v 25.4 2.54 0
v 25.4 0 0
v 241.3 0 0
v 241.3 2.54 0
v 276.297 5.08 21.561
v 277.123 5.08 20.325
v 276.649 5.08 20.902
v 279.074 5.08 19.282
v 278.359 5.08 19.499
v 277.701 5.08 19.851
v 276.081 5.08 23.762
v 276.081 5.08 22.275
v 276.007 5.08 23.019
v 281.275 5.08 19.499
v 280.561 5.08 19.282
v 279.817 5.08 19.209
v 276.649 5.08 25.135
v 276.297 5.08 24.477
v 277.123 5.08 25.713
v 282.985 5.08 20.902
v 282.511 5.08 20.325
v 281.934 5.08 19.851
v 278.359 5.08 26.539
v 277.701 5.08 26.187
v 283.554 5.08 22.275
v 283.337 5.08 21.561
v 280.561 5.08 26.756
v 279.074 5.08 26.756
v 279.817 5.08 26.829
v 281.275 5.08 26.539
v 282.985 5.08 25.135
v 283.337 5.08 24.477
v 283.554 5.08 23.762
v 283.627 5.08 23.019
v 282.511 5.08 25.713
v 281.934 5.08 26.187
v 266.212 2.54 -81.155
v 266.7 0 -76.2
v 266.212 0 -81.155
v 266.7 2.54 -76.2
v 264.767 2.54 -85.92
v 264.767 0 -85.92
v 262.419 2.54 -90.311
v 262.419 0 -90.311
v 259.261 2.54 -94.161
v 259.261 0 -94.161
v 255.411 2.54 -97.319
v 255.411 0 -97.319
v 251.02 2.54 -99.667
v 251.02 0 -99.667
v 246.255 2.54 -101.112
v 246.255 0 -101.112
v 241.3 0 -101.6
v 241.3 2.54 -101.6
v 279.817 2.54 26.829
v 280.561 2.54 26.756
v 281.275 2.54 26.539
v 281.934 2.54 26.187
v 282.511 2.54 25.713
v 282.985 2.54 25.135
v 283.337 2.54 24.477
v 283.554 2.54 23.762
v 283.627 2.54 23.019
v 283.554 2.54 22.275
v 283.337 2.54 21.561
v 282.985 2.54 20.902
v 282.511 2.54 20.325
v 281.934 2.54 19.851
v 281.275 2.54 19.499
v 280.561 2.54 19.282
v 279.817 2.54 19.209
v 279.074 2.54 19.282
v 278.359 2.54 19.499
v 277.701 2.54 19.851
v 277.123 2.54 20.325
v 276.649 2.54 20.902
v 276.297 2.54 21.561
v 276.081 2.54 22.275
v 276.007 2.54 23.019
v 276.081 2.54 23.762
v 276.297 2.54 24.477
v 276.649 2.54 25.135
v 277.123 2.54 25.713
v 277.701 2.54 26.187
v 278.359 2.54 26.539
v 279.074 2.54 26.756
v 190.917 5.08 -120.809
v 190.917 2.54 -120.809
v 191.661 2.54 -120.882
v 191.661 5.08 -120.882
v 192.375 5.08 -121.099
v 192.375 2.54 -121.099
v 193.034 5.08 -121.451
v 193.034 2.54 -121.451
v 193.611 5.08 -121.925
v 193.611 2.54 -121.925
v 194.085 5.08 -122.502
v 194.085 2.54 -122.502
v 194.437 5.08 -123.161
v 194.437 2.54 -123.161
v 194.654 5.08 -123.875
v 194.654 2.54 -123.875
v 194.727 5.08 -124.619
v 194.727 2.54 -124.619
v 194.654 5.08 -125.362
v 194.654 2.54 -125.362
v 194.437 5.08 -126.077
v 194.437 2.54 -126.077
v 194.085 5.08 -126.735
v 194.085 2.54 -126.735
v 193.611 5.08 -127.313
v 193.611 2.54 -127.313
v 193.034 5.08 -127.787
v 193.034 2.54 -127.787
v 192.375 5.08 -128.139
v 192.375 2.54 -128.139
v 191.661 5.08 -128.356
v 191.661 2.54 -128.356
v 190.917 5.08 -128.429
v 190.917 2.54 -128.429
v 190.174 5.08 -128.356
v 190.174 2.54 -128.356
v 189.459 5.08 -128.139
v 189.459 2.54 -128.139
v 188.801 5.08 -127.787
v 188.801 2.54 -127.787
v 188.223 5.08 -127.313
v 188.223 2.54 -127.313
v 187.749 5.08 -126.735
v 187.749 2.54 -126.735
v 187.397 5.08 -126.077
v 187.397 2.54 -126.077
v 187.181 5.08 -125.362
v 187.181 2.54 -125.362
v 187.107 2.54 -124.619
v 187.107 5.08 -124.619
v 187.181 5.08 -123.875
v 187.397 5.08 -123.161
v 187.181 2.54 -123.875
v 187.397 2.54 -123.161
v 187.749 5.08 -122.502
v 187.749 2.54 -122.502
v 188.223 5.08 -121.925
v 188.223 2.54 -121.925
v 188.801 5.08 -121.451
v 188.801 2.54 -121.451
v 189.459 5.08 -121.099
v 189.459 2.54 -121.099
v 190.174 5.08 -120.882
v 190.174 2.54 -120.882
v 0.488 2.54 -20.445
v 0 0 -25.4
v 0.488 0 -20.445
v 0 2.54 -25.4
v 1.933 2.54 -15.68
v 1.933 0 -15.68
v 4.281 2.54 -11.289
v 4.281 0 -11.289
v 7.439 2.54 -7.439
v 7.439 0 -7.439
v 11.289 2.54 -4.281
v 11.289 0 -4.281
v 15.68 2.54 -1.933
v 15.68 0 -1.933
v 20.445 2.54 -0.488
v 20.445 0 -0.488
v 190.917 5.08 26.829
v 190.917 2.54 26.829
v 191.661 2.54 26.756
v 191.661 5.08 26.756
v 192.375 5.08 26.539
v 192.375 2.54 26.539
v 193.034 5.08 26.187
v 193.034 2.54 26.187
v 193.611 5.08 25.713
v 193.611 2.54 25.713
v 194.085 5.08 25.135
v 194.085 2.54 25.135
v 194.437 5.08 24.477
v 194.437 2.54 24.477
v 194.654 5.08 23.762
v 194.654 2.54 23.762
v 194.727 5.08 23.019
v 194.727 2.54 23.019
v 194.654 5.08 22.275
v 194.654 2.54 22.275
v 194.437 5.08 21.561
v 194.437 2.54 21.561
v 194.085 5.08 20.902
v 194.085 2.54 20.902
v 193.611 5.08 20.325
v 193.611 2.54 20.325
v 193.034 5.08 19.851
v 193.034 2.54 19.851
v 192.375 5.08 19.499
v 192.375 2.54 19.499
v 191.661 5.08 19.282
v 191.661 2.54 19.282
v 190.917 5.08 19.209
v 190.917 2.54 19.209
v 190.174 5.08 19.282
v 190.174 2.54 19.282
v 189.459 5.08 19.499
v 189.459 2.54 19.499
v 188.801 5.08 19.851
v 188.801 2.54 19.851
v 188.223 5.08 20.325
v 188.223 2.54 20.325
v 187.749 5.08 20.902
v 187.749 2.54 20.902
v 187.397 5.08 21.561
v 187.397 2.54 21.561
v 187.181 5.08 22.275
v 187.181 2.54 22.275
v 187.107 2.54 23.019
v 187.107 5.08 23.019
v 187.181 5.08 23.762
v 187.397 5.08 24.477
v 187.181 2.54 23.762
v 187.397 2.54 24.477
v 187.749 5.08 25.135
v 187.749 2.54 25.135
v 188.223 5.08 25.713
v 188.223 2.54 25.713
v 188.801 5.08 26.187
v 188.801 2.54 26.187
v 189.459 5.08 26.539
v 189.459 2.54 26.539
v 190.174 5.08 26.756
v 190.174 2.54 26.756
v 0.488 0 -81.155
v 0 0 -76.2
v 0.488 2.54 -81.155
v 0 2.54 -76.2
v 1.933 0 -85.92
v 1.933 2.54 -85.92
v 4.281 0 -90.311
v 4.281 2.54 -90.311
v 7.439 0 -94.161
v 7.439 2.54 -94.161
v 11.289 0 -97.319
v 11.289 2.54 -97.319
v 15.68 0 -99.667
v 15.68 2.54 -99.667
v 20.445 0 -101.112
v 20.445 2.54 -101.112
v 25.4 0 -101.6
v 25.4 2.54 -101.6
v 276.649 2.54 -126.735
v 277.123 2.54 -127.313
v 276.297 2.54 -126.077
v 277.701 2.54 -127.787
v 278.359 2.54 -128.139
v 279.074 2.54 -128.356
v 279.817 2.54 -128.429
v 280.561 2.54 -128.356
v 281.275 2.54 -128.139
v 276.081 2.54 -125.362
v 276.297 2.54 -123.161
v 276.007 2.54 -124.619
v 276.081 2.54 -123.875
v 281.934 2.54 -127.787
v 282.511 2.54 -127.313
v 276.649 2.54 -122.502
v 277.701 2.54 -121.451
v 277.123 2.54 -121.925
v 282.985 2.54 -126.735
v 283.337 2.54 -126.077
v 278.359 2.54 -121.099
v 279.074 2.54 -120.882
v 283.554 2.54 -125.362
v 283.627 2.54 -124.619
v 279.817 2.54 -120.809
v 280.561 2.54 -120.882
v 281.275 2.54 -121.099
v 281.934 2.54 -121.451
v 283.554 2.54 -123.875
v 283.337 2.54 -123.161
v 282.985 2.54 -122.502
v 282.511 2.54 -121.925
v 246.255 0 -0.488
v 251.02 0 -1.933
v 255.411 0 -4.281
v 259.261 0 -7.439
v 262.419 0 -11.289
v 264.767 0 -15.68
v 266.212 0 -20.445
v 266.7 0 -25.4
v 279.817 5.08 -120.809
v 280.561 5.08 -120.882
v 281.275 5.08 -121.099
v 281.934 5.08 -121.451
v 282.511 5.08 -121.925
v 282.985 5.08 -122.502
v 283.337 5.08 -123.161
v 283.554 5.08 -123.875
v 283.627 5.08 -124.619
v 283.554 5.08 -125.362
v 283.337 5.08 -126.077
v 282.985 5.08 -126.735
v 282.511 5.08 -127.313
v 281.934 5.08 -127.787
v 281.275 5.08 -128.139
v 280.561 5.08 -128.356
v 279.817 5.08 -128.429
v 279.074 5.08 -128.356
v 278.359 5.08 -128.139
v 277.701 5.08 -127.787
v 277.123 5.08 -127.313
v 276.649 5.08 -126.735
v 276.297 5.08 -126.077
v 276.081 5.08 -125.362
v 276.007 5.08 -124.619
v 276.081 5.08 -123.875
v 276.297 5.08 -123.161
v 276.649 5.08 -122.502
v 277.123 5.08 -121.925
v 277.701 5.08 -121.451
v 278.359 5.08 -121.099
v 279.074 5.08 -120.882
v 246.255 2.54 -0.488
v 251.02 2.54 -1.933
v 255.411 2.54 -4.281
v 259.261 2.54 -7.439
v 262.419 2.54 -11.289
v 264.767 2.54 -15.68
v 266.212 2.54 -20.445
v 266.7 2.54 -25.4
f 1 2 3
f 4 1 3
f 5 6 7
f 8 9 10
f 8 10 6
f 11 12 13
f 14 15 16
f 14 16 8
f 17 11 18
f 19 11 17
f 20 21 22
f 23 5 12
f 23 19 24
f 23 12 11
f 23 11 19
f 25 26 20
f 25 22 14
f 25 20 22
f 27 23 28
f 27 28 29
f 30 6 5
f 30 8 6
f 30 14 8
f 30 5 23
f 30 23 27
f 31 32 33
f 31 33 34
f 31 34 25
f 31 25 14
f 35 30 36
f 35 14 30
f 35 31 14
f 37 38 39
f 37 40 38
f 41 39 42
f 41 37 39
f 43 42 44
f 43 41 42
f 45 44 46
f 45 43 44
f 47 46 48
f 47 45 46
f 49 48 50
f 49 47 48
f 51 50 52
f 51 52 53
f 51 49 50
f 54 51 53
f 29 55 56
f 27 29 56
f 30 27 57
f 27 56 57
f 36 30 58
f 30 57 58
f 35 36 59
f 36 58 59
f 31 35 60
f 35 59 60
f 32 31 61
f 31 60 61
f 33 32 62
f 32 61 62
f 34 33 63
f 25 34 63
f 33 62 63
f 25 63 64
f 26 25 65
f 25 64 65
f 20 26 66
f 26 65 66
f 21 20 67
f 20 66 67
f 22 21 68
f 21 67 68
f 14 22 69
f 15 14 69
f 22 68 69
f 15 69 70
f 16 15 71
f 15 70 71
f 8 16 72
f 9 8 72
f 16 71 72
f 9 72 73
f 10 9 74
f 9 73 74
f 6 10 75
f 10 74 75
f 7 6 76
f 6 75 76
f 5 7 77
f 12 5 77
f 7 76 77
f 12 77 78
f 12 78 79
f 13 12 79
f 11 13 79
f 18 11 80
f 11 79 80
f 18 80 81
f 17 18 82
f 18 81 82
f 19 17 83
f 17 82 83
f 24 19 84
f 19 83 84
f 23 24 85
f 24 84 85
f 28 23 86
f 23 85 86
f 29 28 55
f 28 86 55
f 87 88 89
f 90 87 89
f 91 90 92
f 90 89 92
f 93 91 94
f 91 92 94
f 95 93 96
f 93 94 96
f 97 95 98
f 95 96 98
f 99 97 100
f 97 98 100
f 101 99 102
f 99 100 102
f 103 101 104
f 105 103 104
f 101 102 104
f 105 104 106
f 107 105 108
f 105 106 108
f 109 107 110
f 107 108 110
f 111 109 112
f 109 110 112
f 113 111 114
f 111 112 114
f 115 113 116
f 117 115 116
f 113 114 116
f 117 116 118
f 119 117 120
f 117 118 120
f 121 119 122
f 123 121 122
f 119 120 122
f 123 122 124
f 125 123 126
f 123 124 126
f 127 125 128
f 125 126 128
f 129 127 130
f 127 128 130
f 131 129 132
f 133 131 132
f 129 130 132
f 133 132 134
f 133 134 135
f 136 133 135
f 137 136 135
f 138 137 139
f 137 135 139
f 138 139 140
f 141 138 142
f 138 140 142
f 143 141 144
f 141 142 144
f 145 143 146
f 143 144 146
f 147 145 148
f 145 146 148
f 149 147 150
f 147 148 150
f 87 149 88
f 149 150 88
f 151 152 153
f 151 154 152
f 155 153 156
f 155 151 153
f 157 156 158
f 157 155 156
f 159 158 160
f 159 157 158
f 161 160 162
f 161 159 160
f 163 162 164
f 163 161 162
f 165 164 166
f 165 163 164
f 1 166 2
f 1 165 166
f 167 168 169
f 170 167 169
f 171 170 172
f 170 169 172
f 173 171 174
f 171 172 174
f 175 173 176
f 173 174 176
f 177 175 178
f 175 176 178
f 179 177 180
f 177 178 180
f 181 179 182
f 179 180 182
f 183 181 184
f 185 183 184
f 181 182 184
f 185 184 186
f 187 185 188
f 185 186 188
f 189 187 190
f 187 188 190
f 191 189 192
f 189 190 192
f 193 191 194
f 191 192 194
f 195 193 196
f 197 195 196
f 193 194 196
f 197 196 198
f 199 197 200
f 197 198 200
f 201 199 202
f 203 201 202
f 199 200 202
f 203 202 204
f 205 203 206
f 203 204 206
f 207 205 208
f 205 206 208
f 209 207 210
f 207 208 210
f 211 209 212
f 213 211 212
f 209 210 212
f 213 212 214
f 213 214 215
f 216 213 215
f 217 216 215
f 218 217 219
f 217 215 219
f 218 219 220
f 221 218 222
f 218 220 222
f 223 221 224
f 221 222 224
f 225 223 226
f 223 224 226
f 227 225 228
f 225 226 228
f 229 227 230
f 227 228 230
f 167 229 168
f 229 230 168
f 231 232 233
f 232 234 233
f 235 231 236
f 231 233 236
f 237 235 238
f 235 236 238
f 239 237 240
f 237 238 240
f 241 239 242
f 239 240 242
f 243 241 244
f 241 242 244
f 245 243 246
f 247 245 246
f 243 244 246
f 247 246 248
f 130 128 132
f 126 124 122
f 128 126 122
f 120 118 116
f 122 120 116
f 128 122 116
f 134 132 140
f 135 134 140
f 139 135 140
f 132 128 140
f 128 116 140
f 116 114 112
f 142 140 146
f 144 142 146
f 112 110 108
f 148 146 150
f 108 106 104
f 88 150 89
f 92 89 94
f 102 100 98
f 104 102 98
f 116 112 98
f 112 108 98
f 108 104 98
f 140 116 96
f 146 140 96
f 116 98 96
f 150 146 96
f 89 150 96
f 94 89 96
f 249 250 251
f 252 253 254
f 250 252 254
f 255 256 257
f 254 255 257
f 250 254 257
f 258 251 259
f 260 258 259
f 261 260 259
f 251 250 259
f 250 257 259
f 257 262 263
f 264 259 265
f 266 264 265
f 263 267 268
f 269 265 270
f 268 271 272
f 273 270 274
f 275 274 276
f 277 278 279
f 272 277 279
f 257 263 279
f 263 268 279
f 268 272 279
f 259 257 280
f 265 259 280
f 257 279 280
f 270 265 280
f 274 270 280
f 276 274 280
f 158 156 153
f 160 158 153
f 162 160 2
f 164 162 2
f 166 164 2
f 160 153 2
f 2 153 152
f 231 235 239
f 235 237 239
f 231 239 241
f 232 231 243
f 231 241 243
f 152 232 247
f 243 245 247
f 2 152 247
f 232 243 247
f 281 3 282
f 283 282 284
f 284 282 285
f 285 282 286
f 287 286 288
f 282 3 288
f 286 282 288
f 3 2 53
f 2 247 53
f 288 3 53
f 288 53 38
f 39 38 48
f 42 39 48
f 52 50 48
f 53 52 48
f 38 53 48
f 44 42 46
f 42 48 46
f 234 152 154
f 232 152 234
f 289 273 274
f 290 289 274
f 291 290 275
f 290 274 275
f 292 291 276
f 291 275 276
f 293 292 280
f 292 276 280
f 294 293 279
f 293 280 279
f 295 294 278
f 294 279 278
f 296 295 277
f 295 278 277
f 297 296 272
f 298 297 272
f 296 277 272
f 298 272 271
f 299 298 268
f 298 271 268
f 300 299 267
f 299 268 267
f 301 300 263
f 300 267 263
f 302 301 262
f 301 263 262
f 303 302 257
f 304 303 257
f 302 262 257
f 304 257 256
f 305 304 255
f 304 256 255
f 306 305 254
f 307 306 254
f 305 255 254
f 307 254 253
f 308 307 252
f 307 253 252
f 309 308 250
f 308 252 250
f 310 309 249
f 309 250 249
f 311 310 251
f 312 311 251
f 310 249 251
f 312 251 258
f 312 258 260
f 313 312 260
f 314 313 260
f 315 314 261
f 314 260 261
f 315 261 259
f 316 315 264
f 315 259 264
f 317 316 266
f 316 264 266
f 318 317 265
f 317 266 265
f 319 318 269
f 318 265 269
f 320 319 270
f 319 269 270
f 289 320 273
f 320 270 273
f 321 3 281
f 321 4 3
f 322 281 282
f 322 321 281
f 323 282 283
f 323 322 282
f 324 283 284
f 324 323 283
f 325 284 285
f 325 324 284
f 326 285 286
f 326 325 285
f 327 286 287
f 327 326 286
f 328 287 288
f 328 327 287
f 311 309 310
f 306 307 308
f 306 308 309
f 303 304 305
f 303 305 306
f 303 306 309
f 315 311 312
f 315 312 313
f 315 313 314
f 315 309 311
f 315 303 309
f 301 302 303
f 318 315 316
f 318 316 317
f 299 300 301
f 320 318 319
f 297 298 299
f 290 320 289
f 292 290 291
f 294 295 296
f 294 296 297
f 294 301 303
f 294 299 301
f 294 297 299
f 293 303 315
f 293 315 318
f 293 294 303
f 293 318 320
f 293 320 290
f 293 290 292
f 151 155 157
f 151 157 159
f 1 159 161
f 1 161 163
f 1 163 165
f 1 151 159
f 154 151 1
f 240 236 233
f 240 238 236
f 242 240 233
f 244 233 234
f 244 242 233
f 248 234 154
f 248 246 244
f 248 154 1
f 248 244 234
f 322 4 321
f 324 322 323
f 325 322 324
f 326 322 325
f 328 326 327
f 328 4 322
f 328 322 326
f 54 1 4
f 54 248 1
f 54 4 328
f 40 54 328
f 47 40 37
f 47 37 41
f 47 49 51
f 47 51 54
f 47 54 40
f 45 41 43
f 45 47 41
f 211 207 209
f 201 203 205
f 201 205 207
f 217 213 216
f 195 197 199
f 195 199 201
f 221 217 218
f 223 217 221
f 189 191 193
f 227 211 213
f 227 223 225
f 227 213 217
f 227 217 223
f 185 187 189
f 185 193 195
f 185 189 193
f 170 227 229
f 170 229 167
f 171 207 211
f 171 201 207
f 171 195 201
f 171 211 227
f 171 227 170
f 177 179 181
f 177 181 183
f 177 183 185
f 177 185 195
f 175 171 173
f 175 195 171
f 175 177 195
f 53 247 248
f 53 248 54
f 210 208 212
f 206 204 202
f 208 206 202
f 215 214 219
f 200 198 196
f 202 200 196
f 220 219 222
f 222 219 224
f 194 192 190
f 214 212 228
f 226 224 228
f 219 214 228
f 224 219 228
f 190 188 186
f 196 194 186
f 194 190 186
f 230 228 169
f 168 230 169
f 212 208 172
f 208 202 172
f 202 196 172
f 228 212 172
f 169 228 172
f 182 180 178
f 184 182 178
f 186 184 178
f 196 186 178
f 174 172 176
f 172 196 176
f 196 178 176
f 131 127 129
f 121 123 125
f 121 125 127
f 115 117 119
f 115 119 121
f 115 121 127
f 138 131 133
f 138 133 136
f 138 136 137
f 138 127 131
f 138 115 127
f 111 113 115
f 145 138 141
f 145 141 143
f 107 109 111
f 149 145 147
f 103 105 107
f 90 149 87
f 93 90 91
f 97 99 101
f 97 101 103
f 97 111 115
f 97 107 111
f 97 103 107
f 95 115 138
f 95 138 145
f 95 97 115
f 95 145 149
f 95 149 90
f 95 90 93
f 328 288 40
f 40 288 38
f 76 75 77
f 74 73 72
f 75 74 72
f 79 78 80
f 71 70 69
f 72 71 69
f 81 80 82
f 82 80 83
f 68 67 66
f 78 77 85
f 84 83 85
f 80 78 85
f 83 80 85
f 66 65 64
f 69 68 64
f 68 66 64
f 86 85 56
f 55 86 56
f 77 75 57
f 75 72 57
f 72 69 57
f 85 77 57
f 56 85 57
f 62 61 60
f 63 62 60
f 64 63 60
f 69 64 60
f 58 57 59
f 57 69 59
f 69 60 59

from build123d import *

# Parameters (mm, degrees)
SKETCH1_W             = 266.7
SKETCH1_H             = 101.6
BOSS_EXTRUDE1_DEPTH   = 2.54
SKETCH3_R             = 3.81
BOSS_EXTRUDE2_DEPTH   = 2.54
BOSS_EXTRUDE2_2_DEPTH = 2.54
BOSS_EXTRUDE2_3_DEPTH = 2.54
BOSS_EXTRUDE2_4_DEPTH = 2.54
FILLET1_R             = 25.4


with BuildPart() as part:
    # Sketch1 → Boss-Extrude1 (new body)
    with BuildSketch(Plane(origin=(0, 0, 0), x_dir=(1, 0, 0), z_dir=(0, 1, 0))):
        with Locations((133.35, 50.8)):
            Rectangle(SKETCH1_W, SKETCH1_H)
    extrude(amount=BOSS_EXTRUDE1_DEPTH)

    # Fillet1
    fillet1_edges = [part.edges().sort_by_distance(p)[0] for p in [
        (0, 1.27, -101.6),
        (266.7, 1.27, -101.6),
        (266.7, 1.27, 0),
        (0, 1.27, 0),
    ]]
    fillet(fillet1_edges, radius=FILLET1_R)


with BuildPart() as body_2:
    # Sketch3 → Boss-Extrude2 (new body)
    with BuildSketch(Plane(origin=(0, 2.54, 0), x_dir=(1, 0, 0), z_dir=(0, 1, 0))):
        with Locations(Location((190.917305237, 124.61875, 0), (0, 0, 270))):
            Circle(SKETCH3_R)
    extrude(amount=BOSS_EXTRUDE2_DEPTH)


with BuildPart() as body_3:
    # Sketch3 → Boss-Extrude2 2 (new body)
    with BuildSketch(Plane(origin=(0, 2.54, 0), x_dir=(1, 0, 0), z_dir=(0, 1, 0))):
        with Locations(Location((279.817305237, 124.61875, 0), (0, 0, 270))):
            Circle(SKETCH3_R)
    extrude(amount=BOSS_EXTRUDE2_2_DEPTH)


with BuildPart() as body_4:
    # Sketch3 → Boss-Extrude2 3 (new body)
    with BuildSketch(Plane(origin=(0, 2.54, 0), x_dir=(1, 0, 0), z_dir=(0, 1, 0))):
        with Locations(Location((279.817305237, -23.01875, 0), (0, 0, 270))):
            Circle(SKETCH3_R)
    extrude(amount=BOSS_EXTRUDE2_3_DEPTH)


with BuildPart() as body_5:
    # Sketch3 → Boss-Extrude2 4 (new body)
    with BuildSketch(Plane(origin=(0, 2.54, 0), x_dir=(1, 0, 0), z_dir=(0, 1, 0))):
        with Locations(Location((190.917305237, -23.01875, 0), (0, 0, 270))):
            Circle(SKETCH3_R)
    extrude(amount=BOSS_EXTRUDE2_4_DEPTH)


solid = Compound([part.part, body_2.part, body_3.part, body_4.part, body_5.part])
